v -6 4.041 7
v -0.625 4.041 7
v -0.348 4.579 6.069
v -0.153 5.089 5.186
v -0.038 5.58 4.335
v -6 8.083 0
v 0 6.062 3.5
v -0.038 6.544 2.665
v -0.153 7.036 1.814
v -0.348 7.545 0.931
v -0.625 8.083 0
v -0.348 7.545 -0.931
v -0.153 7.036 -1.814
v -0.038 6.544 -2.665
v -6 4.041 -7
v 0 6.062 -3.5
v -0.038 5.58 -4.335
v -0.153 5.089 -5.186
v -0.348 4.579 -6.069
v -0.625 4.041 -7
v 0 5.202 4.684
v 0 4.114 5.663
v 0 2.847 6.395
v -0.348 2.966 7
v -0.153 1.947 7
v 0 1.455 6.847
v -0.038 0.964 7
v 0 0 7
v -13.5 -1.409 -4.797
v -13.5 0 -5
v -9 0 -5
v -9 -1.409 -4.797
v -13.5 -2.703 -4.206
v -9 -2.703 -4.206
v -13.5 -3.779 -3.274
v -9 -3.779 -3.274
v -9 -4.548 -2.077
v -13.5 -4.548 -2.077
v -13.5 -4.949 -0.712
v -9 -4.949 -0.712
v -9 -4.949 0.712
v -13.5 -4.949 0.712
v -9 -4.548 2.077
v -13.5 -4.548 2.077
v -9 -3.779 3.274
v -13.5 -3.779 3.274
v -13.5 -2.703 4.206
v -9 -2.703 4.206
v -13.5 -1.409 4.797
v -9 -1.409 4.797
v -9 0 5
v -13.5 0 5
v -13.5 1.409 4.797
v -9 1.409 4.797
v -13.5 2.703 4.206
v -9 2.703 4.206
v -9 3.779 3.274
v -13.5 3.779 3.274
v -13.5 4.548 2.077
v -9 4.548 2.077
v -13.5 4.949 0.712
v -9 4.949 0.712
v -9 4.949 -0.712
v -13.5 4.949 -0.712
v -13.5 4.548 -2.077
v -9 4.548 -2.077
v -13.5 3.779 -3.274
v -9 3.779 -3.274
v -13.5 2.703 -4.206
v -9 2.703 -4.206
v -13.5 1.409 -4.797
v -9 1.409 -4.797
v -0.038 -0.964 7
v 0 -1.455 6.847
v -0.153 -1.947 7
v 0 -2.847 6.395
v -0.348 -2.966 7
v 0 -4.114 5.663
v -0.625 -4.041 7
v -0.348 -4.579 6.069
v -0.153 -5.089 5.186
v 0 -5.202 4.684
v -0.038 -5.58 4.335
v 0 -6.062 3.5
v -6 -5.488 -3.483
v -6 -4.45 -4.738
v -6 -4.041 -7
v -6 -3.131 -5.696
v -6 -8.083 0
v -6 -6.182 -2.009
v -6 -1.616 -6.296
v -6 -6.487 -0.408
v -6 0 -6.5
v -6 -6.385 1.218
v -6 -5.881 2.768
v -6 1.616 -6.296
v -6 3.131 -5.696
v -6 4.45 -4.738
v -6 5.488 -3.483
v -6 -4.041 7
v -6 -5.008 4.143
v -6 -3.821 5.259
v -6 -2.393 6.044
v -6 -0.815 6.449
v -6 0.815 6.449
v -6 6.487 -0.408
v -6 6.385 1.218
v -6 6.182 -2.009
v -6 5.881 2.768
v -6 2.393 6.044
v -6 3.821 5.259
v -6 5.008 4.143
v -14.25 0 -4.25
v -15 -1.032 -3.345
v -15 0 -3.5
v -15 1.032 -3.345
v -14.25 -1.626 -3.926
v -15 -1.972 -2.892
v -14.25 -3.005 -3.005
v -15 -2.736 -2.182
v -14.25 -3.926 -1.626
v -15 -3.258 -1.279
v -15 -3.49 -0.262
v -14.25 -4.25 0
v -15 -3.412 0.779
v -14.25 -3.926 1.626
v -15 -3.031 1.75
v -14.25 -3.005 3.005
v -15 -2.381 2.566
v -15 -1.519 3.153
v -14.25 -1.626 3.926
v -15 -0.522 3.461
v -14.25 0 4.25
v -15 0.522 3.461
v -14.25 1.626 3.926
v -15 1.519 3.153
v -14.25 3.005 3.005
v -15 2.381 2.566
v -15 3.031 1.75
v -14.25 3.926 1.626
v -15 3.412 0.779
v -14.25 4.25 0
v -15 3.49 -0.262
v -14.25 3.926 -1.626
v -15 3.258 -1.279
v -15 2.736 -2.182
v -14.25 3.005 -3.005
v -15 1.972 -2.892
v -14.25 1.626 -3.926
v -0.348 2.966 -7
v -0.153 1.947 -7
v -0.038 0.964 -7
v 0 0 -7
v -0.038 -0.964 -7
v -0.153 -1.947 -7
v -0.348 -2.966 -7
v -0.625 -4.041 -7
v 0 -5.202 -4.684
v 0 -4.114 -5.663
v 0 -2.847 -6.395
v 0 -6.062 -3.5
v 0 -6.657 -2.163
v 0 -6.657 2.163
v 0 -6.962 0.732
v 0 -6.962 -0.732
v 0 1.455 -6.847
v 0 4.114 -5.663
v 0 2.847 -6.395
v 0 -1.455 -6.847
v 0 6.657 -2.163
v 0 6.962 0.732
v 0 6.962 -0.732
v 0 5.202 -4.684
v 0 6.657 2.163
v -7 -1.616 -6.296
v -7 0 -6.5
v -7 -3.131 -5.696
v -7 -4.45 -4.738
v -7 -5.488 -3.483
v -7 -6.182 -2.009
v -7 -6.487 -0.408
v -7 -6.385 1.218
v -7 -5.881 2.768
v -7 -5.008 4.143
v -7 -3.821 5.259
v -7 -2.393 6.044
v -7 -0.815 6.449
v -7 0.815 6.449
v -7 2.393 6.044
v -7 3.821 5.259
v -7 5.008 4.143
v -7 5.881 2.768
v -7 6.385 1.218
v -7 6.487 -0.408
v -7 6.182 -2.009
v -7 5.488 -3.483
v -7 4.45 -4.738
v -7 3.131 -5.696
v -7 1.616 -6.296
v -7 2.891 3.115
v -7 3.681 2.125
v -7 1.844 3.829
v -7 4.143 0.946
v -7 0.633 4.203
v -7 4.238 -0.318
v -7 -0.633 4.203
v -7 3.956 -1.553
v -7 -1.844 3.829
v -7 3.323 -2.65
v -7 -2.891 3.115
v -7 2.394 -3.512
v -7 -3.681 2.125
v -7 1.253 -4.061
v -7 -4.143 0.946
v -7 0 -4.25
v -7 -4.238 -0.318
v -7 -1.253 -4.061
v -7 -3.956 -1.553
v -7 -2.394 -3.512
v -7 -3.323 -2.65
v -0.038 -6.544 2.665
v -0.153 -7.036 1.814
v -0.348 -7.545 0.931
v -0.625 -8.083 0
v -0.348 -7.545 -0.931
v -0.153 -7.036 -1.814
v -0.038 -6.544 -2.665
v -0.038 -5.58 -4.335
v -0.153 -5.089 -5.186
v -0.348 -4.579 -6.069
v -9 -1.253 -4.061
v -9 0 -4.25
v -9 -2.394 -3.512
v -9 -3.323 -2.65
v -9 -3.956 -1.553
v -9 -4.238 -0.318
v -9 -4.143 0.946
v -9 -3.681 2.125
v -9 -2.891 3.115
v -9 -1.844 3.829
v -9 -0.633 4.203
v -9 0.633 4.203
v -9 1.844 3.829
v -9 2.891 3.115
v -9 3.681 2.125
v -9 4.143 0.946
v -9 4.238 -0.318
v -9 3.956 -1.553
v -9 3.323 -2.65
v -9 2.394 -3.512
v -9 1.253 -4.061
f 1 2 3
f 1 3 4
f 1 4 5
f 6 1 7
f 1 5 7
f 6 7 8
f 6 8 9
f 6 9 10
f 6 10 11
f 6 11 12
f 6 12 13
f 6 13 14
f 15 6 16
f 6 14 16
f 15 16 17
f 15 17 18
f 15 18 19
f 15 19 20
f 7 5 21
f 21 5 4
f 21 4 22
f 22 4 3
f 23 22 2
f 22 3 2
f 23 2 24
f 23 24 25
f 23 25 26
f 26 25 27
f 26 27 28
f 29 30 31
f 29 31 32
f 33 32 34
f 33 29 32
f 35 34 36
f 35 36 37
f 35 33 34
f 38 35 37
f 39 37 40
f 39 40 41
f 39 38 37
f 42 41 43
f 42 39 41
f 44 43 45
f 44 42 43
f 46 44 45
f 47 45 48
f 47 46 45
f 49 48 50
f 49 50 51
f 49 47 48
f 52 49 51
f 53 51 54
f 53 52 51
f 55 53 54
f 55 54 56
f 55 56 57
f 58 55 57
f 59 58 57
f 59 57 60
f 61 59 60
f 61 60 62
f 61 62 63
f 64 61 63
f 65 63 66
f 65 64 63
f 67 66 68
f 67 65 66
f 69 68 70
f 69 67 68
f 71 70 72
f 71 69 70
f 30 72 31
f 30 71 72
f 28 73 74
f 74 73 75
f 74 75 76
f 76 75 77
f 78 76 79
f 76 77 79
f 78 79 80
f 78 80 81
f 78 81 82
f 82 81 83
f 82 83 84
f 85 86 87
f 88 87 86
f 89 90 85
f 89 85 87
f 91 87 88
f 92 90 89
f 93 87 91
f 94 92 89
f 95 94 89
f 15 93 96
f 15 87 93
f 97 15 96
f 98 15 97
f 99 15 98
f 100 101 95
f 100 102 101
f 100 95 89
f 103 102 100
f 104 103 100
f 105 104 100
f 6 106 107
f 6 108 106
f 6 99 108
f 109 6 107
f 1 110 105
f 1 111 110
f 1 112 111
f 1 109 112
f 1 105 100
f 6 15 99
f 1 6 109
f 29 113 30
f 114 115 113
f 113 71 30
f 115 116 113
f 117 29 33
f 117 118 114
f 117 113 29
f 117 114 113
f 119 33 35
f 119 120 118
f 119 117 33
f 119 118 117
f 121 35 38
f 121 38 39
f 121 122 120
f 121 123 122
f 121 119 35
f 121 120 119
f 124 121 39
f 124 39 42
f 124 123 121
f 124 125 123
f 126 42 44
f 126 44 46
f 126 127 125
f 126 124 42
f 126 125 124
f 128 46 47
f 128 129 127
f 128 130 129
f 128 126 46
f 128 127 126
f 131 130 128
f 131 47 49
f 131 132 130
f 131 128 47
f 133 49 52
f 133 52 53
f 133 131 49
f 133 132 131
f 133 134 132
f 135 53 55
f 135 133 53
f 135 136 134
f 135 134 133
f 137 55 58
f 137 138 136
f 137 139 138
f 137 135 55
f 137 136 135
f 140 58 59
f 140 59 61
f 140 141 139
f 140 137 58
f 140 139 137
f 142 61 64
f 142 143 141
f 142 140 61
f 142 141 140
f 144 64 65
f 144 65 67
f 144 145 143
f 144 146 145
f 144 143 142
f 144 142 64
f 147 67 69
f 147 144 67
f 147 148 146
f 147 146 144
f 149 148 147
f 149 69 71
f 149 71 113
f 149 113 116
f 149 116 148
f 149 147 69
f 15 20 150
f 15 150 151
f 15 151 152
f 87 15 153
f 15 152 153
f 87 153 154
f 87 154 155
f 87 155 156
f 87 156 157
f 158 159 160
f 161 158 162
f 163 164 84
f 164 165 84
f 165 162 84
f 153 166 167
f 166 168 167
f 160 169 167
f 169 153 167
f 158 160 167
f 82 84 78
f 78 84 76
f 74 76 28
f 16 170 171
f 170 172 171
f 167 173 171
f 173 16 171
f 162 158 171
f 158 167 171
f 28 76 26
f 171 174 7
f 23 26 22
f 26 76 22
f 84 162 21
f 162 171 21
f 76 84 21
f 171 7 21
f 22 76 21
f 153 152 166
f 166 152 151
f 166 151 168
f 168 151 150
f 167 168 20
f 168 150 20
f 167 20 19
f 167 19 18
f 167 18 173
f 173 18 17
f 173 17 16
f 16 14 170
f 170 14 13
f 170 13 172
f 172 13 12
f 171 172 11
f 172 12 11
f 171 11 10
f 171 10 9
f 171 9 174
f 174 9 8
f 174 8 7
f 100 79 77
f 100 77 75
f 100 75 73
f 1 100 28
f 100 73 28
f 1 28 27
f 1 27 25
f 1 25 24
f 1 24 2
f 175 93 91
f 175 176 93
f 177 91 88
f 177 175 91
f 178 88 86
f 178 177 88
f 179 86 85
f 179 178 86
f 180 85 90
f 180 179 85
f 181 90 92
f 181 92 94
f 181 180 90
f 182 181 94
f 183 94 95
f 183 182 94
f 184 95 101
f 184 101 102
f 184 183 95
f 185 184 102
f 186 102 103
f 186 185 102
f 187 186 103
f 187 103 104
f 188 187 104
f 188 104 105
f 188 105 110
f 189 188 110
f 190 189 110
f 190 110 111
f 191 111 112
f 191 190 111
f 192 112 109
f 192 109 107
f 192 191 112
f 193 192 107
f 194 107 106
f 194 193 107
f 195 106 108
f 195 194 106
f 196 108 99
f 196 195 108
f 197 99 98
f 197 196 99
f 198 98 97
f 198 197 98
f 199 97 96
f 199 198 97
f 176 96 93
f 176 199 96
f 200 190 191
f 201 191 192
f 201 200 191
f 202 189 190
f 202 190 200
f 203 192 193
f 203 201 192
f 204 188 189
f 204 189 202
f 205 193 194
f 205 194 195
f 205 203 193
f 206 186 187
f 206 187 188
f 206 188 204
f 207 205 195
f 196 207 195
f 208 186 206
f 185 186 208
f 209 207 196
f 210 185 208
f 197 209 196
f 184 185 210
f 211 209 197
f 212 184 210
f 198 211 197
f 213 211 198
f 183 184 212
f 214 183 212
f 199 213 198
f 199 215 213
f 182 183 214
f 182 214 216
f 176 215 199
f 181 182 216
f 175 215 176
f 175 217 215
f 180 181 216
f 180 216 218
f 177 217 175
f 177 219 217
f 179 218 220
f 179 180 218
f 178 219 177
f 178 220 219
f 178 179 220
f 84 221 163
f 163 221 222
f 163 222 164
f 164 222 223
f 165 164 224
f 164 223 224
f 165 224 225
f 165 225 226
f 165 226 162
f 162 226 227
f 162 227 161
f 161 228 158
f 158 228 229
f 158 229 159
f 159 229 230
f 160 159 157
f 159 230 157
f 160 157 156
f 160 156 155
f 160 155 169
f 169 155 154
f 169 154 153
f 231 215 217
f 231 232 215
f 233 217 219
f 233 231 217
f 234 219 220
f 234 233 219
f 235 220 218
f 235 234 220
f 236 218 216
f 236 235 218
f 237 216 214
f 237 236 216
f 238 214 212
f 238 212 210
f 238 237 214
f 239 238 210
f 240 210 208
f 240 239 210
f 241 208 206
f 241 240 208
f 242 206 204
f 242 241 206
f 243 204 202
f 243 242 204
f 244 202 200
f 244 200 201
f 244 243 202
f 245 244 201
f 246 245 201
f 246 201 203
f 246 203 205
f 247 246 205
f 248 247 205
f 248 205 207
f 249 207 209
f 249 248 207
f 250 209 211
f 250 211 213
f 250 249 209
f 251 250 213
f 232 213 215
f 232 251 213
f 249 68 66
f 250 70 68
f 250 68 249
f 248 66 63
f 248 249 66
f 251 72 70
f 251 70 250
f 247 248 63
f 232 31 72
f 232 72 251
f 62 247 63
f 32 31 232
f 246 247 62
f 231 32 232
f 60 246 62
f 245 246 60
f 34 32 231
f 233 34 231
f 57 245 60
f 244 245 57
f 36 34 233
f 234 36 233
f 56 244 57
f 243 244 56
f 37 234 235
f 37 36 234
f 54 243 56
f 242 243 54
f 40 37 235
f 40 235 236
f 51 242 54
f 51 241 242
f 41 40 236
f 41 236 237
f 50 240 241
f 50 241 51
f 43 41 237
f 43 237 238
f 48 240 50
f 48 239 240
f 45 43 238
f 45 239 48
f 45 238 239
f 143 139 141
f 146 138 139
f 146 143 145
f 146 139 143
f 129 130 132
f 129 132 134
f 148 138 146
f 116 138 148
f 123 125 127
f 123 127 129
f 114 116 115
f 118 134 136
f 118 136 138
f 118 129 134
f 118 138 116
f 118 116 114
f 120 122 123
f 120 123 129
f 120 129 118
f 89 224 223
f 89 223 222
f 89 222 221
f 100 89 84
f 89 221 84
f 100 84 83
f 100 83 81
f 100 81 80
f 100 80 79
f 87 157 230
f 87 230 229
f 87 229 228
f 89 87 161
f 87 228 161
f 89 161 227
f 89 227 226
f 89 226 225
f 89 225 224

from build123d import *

# Parameters (mm, degrees)
EXTRUDE_1_DEPTH = 6
CHAMFER_1_SIZE  = 1.5


with BuildPart() as part:
    # 草图1 → 凸台-拉伸1 (new body)
    with BuildSketch(Plane(origin=(0, 0, 0), x_dir=(0, 0, -1), z_dir=(1, 0, 0))):
        Polygon((0, 8.082903769), (7, 4.041451884), (7, -4.041451884), (0, -8.082903769), (-7, -4.041451884), (-7, 4.041451884), align=None)
    extrude(amount=-EXTRUDE_1_DEPTH)

    # 草图3 → 旋转1 (revolve)
    with BuildSketch(Plane.XY, mode=Mode.PRIVATE) as revolve_1_sk:
        Polygon((-6, 6.5), (-7, 6.5), (-7, 4.25), (-9, 4.25), (-9, 5), (-15, 5), (-15, 0), (-6, 0), align=None)
    revolve(revolve_1_sk.sketch.rotate(Axis((10.611885909, 0, 0), (-1, 0, 0)), 90), axis=Axis((10.611885909, 0, 0), (-1, 0, 0)))

    # 草图4 → 切除-旋转1 (revolve, cut)
    with BuildSketch(Plane.XY):
        Polygon((0, -7), (-1.467666471, -9.542072896), (2.047412029, -9.542072896), align=None)
    revolve(axis=Axis((-15, 0, 0), (1, 0, 0)), mode=Mode.SUBTRACT)

    # 倒角1
    chamfer_1_edges = [part.edges().sort_by_distance(p)[0] for p in [
        (-15, 0, 5),
    ]]
    chamfer(chamfer_1_edges, length=CHAMFER_1_SIZE)


solid = part.part
